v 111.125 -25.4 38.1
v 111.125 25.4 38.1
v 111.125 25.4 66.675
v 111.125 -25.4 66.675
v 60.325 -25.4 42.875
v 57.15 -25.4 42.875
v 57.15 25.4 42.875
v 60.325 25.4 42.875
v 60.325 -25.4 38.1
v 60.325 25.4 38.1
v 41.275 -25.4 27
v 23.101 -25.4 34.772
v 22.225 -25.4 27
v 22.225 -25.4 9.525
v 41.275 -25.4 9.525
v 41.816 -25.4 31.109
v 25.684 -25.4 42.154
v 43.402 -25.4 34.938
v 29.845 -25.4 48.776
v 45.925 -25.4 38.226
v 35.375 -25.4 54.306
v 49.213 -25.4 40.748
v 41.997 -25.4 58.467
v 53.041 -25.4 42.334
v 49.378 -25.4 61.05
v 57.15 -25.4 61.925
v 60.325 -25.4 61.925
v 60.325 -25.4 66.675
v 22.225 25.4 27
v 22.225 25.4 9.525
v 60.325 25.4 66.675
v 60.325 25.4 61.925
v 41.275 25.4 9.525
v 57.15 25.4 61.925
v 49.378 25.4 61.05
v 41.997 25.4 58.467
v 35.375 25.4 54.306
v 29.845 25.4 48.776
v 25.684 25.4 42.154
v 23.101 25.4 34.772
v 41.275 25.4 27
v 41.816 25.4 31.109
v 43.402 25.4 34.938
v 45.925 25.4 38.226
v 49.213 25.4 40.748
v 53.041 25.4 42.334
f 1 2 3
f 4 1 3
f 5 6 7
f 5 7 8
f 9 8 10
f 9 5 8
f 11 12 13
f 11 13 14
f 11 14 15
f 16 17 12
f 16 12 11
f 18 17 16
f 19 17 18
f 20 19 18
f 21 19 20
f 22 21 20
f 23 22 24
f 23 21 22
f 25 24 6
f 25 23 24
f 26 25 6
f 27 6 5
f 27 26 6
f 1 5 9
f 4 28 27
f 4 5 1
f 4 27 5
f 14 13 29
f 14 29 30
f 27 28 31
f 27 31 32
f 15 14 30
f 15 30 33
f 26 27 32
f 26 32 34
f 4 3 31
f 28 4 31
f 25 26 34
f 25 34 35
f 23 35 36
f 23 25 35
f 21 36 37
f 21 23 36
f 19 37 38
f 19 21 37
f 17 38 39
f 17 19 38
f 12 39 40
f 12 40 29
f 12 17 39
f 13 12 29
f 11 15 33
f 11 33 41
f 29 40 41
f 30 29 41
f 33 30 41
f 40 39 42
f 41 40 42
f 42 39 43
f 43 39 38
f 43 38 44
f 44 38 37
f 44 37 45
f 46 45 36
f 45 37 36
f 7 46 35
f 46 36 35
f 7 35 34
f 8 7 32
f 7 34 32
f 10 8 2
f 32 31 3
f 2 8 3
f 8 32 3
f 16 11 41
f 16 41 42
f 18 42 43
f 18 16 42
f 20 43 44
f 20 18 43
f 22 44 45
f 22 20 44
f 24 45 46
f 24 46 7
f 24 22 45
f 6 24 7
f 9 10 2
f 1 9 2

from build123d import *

# Parameters (mm, degrees)
F0_W     = 25.4
F0_H     = 19.05
F0_H_2   = 4.7498
F0_H_3   = 4.7752
F1_DEPTH = 25.4


with BuildPart() as f1:
    # F0 (on Front) → F1 (new body, symmetric)
    with BuildSketch(Plane.XZ):
        Polygon((85.725, 66.675), (85.725, 61.9252), (85.725, 42.8752), (85.725, 38.1), (111.125, 38.1), (111.125, 66.675), align=None)
        with Locations((73.025, 52.4002)):
            Rectangle(F0_W, F0_H)
        with Locations((73.025, 64.3001)):
            Rectangle(F0_W, F0_H_2)
        with Locations((73.025, 40.4876)):
            Rectangle(F0_W, F0_H_3)
        with BuildLine():
            Line((22.225, 27.0002), (22.225, 9.525))
            Line((22.225, 9.525), (41.275, 9.525))
            Line((41.275, 9.525), (41.275, 27.0002))
            ThreePointArc((41.275, 27.0002), (45.9246798487, 38.2255201513), (57.15, 42.8752))
            Line((57.15, 42.8752), (60.325, 42.8752))
            Line((60.325, 42.8752), (60.325, 61.9252))
            Line((60.325, 61.9252), (57.15, 61.9252))
            ThreePointArc((57.15, 61.9252), (32.4542956671, 51.6959043329), (22.225, 27.0002))
        make_face()
    extrude(amount=F1_DEPTH, both=True)


solid = f1.part
